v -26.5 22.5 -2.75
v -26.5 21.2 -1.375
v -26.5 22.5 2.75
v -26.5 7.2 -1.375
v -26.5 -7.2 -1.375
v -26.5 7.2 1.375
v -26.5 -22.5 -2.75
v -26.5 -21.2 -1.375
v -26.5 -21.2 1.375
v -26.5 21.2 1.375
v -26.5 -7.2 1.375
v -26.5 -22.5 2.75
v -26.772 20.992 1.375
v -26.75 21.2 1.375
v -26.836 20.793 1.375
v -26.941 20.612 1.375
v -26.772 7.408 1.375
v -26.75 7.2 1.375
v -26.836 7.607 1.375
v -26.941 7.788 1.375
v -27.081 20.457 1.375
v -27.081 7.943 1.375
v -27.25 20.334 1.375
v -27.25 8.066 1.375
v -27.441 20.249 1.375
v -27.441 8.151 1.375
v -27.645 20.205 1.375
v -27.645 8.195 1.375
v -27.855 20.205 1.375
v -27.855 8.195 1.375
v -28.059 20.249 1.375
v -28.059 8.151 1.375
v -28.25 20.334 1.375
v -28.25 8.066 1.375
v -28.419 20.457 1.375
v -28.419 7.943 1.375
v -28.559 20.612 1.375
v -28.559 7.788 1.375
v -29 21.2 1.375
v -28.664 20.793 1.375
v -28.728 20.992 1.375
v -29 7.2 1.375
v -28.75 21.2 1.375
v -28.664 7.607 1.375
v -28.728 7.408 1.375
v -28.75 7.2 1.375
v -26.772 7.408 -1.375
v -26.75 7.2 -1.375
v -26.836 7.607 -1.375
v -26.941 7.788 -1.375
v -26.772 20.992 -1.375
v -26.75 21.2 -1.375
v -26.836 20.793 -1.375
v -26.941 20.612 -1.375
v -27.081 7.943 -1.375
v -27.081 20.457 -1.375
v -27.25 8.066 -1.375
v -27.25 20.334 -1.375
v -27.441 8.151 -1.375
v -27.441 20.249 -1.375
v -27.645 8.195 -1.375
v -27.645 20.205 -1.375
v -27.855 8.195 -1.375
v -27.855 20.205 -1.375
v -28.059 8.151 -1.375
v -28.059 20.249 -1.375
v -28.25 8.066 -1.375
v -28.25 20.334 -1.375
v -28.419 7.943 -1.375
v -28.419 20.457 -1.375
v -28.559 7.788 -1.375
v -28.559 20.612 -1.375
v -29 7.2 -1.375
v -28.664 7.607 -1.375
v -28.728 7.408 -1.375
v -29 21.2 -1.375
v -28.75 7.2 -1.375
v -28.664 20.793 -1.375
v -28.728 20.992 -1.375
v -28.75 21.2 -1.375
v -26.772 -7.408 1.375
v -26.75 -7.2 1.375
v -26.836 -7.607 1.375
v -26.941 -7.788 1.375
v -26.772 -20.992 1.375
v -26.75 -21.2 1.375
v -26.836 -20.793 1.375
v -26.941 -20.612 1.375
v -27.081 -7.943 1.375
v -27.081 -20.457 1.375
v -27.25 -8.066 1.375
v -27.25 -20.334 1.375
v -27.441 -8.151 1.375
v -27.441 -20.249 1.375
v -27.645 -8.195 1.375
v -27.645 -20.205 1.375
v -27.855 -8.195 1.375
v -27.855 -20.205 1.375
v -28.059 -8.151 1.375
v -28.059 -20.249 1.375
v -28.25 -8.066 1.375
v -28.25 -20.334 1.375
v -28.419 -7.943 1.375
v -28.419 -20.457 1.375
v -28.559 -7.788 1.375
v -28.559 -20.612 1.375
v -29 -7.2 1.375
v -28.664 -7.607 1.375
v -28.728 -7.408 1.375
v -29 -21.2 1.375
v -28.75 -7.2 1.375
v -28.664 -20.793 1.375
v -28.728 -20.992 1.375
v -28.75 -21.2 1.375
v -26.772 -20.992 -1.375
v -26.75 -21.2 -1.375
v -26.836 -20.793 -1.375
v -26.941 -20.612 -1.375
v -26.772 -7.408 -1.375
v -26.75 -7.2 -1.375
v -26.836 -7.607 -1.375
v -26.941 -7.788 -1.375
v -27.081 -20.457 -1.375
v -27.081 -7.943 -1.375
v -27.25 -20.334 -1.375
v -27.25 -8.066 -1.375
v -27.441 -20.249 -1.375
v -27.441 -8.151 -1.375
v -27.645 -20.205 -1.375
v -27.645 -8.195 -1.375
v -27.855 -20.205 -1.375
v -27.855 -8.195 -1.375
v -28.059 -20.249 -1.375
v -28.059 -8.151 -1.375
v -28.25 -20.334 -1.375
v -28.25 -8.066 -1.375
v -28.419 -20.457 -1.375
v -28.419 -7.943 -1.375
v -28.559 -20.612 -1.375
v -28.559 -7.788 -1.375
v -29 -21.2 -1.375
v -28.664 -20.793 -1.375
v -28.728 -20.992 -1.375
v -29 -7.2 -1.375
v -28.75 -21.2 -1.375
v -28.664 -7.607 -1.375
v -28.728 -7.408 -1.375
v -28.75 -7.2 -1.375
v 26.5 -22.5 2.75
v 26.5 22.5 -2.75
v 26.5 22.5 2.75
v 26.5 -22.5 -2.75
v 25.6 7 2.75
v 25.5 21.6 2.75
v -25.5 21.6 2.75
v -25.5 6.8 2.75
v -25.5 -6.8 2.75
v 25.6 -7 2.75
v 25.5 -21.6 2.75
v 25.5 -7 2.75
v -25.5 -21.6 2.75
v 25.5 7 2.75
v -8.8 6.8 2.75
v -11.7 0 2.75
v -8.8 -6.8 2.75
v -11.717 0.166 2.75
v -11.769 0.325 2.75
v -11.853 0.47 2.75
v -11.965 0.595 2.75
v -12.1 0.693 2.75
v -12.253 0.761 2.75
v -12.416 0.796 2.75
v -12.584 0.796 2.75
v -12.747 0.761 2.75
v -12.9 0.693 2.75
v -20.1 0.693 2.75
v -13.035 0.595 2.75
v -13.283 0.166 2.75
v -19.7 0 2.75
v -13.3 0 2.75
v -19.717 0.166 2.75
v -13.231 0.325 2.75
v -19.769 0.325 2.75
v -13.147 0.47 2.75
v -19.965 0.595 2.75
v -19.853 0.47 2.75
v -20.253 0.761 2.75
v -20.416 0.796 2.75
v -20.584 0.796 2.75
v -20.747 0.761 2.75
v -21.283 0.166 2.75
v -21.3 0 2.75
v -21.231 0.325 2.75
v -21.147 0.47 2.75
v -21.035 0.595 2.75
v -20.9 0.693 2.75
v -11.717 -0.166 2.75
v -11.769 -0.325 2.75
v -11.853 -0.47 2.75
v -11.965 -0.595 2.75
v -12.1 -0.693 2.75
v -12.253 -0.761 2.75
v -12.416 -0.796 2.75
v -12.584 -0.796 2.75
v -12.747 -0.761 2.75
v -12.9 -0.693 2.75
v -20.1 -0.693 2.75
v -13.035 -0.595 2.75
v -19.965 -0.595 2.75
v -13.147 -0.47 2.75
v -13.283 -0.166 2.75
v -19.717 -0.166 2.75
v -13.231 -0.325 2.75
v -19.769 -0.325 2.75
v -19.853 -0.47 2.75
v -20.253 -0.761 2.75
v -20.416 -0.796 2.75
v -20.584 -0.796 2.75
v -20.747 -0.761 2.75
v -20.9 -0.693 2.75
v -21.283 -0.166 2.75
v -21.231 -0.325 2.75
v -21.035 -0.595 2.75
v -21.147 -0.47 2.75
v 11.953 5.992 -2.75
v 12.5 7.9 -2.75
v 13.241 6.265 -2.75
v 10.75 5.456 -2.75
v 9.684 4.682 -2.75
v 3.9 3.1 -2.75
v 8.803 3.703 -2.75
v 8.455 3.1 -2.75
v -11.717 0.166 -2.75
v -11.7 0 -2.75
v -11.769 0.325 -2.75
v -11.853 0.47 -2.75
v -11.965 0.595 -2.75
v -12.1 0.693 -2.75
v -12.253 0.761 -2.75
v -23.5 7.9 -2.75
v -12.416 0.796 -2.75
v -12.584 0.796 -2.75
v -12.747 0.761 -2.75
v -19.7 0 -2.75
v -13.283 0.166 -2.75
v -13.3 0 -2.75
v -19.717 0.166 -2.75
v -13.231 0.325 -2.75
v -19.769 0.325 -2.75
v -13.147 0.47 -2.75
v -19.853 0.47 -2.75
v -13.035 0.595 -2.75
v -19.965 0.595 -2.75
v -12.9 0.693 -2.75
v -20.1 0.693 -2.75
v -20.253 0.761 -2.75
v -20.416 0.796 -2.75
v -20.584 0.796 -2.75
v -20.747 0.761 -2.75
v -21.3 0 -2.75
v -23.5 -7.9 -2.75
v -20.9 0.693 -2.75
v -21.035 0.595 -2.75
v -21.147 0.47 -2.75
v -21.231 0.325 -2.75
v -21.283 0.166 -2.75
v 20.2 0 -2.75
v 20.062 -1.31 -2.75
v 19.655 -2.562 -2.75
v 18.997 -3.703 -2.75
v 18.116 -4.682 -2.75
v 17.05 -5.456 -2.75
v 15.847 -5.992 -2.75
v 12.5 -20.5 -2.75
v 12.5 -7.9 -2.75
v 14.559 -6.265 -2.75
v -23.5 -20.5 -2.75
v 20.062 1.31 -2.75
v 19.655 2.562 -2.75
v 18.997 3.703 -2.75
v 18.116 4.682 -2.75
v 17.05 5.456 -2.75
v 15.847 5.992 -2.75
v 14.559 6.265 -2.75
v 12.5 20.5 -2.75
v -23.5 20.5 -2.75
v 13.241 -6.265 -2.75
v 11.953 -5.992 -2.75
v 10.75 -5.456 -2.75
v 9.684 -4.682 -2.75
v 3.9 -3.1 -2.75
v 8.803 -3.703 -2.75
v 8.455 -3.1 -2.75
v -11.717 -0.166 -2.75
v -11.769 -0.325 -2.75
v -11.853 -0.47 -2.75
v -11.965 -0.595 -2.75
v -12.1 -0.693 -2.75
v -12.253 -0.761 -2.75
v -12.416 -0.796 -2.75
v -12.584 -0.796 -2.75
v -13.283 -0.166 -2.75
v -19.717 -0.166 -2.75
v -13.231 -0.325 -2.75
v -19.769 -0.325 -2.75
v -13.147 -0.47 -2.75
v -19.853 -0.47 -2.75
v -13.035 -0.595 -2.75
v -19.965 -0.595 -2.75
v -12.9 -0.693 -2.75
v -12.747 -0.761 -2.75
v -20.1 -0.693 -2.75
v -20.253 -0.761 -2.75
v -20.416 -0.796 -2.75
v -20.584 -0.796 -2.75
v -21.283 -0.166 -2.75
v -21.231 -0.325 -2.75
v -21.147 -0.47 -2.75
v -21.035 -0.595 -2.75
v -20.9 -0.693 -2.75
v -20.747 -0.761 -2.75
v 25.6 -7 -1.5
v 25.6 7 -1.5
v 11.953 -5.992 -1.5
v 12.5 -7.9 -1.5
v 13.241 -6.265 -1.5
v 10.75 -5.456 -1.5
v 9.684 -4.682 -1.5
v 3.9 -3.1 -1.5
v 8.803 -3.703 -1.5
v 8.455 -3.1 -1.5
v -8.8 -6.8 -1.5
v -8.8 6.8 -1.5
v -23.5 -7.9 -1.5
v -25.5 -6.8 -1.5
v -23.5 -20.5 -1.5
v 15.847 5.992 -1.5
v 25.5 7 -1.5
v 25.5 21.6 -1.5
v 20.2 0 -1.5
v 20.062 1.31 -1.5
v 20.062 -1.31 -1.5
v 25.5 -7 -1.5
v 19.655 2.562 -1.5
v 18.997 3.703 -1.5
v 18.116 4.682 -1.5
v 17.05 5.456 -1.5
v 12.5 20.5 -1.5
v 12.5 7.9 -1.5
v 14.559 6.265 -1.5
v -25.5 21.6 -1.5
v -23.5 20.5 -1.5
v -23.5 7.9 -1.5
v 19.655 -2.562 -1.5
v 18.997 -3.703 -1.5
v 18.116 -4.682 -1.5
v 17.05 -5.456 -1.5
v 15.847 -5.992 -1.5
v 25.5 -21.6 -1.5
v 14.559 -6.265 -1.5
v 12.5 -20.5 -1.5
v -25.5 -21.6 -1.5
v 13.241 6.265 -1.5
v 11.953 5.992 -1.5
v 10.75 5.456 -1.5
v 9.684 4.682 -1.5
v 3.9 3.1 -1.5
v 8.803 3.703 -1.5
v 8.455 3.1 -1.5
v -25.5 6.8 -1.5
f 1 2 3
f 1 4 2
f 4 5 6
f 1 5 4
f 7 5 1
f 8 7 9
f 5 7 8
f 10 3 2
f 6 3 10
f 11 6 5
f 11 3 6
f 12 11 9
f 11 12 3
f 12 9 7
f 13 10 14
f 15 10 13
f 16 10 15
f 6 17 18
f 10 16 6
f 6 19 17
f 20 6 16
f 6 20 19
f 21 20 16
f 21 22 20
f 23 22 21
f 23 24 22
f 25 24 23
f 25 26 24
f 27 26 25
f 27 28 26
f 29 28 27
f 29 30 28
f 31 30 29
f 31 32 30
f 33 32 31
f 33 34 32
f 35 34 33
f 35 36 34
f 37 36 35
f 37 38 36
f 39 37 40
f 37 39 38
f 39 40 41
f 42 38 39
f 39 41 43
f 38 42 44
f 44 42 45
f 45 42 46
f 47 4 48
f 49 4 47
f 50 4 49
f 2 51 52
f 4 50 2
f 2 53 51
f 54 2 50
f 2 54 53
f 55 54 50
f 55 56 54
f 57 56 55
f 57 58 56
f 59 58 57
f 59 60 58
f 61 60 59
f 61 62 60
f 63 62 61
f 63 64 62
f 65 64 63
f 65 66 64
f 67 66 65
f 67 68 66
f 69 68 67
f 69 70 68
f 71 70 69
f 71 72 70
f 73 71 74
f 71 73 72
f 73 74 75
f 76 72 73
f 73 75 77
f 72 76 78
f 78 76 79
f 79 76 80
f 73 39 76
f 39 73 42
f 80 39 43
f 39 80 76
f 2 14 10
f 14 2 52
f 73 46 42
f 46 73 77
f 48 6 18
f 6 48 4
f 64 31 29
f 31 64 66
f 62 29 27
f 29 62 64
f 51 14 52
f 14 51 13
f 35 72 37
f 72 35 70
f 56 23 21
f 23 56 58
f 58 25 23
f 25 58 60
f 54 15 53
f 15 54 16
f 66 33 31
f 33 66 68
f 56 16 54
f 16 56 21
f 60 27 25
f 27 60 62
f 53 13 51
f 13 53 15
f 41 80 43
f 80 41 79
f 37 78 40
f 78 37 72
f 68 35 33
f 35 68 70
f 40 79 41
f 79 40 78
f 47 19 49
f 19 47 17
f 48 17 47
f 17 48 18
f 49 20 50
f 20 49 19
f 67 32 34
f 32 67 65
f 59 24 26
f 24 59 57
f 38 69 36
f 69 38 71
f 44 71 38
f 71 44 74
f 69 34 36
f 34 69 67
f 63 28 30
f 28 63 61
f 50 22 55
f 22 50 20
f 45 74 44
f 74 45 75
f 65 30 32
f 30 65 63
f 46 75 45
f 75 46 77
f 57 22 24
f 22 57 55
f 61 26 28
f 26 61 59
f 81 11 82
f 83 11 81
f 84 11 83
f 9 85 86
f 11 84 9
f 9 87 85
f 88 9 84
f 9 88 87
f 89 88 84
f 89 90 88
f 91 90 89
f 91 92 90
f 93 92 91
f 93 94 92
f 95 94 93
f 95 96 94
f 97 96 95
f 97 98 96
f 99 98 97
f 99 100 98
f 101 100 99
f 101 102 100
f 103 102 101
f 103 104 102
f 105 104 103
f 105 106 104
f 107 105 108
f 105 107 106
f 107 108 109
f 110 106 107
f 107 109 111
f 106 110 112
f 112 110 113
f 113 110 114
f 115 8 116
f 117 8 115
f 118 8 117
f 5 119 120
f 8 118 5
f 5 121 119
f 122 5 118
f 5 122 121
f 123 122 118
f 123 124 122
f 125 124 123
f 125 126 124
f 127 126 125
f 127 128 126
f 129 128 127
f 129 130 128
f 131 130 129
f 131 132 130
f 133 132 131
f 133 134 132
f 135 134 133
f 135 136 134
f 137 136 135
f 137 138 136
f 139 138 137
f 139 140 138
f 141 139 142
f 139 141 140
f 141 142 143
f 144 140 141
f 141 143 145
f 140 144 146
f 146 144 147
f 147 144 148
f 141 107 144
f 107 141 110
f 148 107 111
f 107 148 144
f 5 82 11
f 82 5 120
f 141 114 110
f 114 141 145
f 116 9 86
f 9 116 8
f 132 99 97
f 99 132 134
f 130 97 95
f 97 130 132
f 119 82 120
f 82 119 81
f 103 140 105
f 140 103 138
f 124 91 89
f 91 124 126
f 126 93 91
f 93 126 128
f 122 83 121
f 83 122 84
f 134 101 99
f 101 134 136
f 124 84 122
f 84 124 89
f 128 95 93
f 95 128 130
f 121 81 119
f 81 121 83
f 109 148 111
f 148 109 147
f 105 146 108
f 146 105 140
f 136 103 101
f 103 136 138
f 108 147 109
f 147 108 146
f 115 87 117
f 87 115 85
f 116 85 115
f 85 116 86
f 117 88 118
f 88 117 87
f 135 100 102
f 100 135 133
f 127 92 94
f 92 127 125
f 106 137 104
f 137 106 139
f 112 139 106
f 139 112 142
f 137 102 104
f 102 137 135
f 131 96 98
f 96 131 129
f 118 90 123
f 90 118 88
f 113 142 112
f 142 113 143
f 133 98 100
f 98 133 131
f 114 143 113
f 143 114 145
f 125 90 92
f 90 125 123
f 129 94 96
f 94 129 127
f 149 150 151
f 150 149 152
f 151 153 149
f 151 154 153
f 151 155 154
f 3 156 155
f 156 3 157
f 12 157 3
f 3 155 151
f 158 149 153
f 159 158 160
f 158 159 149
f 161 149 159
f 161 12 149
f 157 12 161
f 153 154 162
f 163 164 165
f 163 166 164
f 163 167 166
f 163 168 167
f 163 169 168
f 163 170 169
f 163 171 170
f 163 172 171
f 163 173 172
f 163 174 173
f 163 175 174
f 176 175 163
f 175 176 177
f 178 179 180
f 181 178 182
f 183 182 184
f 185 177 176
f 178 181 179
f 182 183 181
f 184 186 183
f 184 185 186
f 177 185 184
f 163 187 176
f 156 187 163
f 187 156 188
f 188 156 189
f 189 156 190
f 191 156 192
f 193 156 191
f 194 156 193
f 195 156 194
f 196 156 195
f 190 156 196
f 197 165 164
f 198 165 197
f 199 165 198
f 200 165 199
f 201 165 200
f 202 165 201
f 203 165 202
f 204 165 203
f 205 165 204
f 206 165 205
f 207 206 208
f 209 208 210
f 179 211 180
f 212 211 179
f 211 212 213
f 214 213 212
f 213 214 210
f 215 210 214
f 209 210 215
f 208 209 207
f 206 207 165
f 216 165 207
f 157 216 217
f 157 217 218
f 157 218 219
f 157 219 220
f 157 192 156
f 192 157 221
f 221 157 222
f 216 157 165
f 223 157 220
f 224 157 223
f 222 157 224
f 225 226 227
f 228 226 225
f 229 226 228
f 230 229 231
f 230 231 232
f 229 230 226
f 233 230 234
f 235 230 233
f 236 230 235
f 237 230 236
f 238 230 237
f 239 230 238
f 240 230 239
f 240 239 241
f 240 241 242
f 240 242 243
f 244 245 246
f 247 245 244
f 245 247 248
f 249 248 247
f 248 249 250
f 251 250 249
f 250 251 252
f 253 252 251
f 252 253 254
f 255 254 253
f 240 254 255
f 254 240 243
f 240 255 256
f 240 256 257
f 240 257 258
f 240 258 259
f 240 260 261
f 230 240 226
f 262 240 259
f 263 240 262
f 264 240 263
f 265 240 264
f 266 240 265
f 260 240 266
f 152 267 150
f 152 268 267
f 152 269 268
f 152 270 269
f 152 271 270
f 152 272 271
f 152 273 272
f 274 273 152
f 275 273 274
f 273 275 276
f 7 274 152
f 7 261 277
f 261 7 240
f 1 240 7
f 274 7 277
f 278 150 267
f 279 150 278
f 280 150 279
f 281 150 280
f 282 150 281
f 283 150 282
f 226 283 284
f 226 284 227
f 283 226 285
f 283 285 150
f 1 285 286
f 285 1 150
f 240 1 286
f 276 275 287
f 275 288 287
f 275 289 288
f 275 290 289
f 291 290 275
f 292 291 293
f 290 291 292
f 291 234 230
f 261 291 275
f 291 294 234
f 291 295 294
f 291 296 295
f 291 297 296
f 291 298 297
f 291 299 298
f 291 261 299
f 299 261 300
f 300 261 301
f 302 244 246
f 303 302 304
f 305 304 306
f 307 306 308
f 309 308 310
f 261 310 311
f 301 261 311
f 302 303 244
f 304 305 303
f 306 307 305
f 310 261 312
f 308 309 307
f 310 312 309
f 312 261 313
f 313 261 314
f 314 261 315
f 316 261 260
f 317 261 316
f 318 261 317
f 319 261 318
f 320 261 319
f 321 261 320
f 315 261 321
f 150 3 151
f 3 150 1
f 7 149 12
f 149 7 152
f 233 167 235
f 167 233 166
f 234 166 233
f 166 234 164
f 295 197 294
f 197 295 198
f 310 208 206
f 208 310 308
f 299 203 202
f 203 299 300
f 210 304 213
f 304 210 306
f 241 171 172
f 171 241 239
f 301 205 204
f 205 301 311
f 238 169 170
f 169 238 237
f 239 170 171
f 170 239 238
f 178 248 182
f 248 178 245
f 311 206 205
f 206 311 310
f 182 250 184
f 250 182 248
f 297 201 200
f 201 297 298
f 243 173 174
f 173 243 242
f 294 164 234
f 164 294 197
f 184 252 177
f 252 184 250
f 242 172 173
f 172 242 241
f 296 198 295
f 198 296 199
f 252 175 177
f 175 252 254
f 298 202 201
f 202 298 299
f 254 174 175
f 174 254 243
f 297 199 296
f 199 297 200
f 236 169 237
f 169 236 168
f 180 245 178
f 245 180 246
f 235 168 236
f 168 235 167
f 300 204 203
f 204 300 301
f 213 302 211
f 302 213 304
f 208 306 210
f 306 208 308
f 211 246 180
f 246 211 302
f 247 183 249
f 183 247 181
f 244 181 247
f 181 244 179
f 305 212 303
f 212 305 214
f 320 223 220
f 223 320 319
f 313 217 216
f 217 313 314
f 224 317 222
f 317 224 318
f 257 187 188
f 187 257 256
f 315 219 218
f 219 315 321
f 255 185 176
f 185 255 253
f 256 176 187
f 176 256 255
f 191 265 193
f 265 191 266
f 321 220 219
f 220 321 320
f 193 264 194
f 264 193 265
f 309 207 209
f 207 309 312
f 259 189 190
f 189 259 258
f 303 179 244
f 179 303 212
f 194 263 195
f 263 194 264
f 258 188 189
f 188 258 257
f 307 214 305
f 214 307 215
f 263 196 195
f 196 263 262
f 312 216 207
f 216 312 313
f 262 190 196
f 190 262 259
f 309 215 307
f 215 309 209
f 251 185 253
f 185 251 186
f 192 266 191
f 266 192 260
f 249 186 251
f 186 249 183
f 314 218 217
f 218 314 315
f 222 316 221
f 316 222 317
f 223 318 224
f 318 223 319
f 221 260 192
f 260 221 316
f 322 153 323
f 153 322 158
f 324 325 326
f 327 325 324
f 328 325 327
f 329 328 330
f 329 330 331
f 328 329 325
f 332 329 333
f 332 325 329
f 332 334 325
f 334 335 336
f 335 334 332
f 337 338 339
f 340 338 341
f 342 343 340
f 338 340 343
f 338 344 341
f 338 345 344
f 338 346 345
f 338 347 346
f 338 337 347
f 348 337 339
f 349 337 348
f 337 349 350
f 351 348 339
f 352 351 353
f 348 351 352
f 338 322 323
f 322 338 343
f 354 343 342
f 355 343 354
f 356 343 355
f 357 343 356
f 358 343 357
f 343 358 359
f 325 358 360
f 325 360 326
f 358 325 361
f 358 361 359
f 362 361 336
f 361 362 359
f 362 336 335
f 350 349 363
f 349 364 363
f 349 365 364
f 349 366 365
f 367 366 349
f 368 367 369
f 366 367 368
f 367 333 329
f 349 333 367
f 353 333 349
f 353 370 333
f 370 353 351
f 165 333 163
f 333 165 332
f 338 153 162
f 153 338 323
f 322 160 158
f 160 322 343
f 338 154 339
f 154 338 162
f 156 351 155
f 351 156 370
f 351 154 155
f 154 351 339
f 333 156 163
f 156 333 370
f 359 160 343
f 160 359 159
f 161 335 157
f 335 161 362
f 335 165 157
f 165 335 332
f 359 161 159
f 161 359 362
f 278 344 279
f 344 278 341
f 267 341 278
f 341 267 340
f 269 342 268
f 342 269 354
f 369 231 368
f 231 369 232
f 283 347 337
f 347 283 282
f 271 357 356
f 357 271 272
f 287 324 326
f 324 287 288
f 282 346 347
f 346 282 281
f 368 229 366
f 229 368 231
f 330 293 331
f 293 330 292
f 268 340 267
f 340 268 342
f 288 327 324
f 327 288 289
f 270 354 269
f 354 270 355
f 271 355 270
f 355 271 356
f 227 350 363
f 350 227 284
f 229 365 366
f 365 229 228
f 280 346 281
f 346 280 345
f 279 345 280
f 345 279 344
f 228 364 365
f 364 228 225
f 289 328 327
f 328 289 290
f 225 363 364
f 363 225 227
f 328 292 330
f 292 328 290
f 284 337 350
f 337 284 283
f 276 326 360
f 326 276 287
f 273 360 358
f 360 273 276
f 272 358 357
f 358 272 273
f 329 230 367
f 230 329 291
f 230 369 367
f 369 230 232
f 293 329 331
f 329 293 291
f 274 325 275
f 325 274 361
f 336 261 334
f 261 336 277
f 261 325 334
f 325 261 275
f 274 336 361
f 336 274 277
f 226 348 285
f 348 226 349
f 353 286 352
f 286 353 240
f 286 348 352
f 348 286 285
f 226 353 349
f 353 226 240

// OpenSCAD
$fn = 30;
tubeRadius = 2;

seatLength=34;
seatWidth=14;
tabsLength=4.2;

baseHeight=5.5;
servoNeckRadius=6.3;
servoNeckTabLength=7;
servoNeckTabWidth=6.2;

servoLength=24;
servoWidth=12.6;
servoDepth=6;
servoScrewDistance=29;
servoScrewRadius=0.8;

hookHoleRadius=1;
hookLength=2.5;
toatlsSeatLength=seatLength*1.5+2;

spacer=0.2;


//seat();
seatRun();

module seat()
{
    difference()
    {
        cube([seatLength,seatWidth,baseHeight], center=true);
        translate([5.4,0,0]) cylinder(r=servoNeckRadius, h=baseHeight*6, center=true);
        //cube([5+3,6.6,baseHeight*6], center=true);
        cube([servoNeckTabLength,servoNeckTabWidth,baseHeight*6], center=true);
        translate([0,0,servoDepth/2]) cube([servoLength, servoWidth, servoDepth+3], center=true);
        translate([servoScrewDistance/2,0,0]) cylinder(r=servoScrewRadius, h=baseHeight*6, center=true);
        translate([-servoScrewDistance/2,0,0]) cylinder(r=servoScrewRadius, h=baseHeight*6, center=true);
    }
 }
 
 module hook()
 {
     difference()
     {
        cube([hookLength,seatWidth,baseHeight/2], center=true);
        translate([0,seatWidth/2,0]) cylinder(r=hookHoleRadius, h=baseHeight, center=true);
        translate([0,-seatWidth/2,0]) cylinder(r=hookHoleRadius, h=baseHeight, center=true);
     }
 }
 
 module seatRun()
 {
    translate([-toatlsSeatLength/2-hookLength/2,seatWidth+spacer,0]) hook();
    translate([-toatlsSeatLength/2-hookLength/2,-seatWidth-spacer,0]) hook();
    
    difference()
    {
        cube([seatLength*1.5+2,seatWidth*3+2+spacer*5,baseHeight], center=true);
        
        //Screw holes in track
        translate([-servoScrewDistance/2+2,0,0]) cylinder(r=servoScrewRadius, h=baseHeight*6, center=true);
        translate([-servoScrewDistance/2-6,0,0]) cylinder(r=servoScrewRadius, h=baseHeight*6, center=true);
        
        //3 cut away sections for servos
        translate([1.5*servoDepth/2+servoDepth/2+spacer*2+0.5,0,servoDepth/2]) cube([seatLength+spacer*2, seatWidth, servoDepth+3], center=true);
        translate([0,seatWidth+spacer,servoDepth/2]) cube([seatLength*1.5, seatWidth+spacer*4, servoDepth+3], center=true);
        translate([0,-seatWidth-spacer,servoDepth/2]) cube([seatLength*1.5, seatWidth+spacer*4, servoDepth+3], center=true);
        
        //middle servo hole
        translate([4.2+servoDepth/2+spacer*2+servoNeckRadius,0,0]) cylinder(r=servoNeckRadius, h=baseHeight*6, center=true);
        translate([4+servoDepth/2+spacer*2,0,0]) cube([servoNeckTabLength,servoNeckTabWidth,baseHeight*6], center=true);
        
        //sliding hole in left and right track
        translate([-servoDepth/2-spacer+4-servoNeckRadius,-seatWidth-spacer,servoDepth/2]) cube([seatLength+2, servoNeckRadius*2, baseHeight*3], center=true);
        
         translate([-servoDepth/2-spacer+4-servoNeckRadius,seatWidth+spacer,servoDepth/2]) cube([seatLength+2, servoNeckRadius*2, baseHeight*3], center=true);
        
    }
 }
